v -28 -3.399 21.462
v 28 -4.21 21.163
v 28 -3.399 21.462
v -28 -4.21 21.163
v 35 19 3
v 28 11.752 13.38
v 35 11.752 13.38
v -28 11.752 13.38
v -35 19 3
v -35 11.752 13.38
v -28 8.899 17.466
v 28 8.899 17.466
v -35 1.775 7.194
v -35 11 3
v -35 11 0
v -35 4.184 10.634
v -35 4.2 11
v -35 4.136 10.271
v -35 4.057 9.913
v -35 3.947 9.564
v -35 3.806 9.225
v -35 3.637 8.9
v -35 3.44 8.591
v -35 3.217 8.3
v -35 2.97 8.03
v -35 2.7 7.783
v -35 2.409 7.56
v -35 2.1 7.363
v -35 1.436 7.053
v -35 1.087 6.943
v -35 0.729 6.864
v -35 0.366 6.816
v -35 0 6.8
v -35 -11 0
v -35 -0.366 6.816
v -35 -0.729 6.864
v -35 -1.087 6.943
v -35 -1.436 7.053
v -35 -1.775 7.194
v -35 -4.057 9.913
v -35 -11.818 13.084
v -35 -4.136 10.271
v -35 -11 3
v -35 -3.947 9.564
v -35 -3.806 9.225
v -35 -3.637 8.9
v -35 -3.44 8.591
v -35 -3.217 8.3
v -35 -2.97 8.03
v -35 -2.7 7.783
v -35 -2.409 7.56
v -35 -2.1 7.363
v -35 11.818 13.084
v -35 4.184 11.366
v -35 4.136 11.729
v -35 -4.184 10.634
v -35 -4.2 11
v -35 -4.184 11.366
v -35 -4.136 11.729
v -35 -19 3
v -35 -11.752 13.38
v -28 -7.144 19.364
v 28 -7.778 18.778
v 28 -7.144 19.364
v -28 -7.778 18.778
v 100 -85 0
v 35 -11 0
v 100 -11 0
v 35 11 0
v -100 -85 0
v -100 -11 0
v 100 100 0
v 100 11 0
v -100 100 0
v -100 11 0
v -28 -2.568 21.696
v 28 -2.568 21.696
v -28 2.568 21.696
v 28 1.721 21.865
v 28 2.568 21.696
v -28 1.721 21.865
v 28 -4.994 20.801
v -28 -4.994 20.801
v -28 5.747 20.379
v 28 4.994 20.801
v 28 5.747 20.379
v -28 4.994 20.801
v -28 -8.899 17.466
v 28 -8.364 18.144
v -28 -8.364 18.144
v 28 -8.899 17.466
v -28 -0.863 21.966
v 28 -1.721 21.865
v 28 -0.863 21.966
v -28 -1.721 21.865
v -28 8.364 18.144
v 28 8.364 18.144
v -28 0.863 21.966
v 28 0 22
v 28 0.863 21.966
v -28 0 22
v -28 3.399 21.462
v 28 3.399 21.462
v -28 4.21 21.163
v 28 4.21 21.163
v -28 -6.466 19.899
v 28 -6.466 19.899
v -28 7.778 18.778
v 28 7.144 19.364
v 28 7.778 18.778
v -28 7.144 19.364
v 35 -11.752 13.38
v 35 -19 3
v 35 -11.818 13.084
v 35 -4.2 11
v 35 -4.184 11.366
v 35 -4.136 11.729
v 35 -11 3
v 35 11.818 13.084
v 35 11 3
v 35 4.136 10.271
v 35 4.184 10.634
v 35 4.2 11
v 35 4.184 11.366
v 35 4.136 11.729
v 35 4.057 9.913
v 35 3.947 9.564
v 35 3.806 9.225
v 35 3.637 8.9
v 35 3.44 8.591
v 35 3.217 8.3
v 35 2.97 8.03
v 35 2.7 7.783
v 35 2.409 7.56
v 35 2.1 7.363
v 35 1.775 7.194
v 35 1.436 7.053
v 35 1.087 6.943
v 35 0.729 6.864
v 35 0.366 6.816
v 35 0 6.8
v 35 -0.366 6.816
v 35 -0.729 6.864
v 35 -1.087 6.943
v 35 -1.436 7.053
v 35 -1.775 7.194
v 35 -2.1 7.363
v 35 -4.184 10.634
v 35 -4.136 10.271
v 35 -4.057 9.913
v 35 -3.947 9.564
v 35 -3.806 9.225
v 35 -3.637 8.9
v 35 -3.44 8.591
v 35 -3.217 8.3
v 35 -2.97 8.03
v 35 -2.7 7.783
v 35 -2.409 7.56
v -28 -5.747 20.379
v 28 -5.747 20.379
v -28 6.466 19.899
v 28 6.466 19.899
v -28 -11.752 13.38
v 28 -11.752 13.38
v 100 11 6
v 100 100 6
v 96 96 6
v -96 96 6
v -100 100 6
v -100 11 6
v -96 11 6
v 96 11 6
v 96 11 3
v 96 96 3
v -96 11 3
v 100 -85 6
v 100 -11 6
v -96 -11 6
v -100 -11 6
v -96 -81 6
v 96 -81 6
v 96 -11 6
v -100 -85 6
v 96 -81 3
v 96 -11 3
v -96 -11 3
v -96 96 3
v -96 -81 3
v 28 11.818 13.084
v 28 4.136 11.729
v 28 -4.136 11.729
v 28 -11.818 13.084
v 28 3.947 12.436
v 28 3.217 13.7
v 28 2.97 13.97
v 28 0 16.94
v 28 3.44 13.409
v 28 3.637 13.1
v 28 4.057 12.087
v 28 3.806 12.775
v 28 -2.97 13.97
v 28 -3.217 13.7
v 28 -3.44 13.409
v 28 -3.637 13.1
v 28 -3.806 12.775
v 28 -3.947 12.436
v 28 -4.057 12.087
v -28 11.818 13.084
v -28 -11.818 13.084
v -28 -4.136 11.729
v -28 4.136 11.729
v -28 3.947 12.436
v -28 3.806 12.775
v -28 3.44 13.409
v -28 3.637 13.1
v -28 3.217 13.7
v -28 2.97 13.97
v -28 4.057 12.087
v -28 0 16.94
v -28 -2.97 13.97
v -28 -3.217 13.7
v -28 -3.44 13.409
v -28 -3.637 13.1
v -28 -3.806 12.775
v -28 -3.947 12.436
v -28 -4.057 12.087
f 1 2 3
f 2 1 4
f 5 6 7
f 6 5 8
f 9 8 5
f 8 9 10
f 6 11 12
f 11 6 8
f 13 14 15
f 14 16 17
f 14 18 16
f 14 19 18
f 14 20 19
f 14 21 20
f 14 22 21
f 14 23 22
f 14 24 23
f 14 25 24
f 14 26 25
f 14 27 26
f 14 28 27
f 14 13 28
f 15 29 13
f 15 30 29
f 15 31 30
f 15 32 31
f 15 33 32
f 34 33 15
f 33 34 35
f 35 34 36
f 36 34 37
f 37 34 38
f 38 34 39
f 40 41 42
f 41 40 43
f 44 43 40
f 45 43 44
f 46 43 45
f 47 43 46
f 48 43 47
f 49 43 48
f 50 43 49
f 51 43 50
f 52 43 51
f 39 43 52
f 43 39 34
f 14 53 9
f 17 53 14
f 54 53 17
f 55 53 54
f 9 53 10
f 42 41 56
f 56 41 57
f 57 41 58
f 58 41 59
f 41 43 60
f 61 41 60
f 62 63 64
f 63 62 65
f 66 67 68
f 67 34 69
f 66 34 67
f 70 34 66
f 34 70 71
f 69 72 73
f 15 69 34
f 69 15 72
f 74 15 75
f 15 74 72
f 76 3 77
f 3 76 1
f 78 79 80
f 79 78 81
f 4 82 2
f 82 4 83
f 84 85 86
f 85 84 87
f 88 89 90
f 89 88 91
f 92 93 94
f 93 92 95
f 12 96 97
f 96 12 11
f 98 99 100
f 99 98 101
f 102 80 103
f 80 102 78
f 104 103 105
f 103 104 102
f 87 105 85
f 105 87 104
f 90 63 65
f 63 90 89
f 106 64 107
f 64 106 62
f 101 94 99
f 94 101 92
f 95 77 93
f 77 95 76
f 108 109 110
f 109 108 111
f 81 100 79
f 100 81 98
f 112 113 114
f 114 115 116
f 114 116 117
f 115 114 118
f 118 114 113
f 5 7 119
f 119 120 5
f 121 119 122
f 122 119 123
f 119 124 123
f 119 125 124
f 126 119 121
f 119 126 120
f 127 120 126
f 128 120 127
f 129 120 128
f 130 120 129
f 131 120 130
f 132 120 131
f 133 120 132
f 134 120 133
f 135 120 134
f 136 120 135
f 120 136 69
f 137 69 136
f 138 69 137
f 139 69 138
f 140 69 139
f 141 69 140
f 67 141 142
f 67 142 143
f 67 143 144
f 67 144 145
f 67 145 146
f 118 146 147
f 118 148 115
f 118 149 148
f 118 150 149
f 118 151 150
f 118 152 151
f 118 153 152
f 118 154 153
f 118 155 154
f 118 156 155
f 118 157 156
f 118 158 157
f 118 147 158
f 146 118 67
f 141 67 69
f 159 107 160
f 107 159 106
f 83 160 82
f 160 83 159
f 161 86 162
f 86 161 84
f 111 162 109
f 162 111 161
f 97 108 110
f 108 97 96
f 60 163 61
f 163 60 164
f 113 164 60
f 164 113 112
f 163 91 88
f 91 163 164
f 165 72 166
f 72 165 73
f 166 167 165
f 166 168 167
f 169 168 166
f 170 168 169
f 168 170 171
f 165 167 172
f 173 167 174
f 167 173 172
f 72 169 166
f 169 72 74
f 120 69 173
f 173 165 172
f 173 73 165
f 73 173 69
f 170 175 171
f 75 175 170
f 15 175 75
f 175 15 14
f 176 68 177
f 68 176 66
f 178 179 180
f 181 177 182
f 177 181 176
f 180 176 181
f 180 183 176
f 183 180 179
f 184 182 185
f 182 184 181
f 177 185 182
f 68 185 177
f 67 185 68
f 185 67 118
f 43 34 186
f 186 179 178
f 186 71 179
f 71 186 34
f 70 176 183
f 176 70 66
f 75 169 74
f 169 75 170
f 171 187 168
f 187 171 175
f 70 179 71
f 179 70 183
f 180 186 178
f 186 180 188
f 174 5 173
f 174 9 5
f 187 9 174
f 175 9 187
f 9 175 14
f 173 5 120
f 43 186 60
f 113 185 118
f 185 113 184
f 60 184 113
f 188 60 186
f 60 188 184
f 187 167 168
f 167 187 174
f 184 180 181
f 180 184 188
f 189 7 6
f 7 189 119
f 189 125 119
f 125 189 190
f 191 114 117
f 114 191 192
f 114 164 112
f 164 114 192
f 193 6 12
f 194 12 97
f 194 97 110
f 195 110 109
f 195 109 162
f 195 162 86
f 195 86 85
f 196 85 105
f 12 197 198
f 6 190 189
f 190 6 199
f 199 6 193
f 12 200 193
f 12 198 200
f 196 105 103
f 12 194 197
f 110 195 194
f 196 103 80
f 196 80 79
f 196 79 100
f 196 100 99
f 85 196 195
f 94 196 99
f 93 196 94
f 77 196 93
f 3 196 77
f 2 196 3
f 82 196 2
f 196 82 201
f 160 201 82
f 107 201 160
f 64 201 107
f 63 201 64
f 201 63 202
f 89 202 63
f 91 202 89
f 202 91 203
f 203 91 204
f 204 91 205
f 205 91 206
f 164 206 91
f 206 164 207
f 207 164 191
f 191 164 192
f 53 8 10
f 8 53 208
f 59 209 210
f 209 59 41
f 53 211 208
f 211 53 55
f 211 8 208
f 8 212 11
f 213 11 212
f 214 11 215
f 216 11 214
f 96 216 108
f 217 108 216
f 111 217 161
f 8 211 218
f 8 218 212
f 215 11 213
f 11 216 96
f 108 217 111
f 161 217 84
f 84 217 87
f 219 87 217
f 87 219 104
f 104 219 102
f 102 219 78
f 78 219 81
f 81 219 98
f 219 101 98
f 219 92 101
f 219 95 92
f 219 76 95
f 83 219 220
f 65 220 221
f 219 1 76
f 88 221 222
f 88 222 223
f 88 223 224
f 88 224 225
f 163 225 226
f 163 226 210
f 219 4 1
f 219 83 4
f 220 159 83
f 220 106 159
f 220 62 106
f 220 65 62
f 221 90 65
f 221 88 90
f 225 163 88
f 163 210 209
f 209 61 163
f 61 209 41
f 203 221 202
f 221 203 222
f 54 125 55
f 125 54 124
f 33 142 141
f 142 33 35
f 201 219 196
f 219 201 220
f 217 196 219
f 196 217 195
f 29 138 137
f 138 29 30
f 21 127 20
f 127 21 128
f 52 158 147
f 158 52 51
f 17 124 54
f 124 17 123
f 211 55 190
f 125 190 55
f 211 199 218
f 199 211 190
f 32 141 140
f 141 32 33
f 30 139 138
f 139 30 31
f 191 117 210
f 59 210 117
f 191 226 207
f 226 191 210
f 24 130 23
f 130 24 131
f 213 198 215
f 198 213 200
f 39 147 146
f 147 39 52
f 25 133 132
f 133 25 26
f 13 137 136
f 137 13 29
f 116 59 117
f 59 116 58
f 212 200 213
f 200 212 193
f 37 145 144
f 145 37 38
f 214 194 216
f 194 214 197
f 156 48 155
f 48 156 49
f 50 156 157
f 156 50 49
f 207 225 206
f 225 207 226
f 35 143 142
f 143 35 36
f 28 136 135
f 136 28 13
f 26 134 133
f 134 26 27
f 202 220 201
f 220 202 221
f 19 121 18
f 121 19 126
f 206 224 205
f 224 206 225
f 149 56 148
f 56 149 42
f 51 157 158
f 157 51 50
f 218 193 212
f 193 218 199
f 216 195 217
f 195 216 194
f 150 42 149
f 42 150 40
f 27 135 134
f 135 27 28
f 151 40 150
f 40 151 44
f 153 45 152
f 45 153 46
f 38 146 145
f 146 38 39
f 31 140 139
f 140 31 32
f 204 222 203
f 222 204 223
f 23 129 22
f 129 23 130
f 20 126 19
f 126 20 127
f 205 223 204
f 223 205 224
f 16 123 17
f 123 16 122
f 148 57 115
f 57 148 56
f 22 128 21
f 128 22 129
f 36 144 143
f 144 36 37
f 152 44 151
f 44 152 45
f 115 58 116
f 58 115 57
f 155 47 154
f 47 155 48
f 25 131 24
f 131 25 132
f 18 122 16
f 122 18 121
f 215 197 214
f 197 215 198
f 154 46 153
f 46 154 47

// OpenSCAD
// file: lib/bores.scad
// Shared bore helpers. Lives under cad/lib/ so regen_all.py does not try
// to export it as a printable part (it scans cad/ and cad/calibration/ only).

// Horizontal rod bore, printable without supports: a cylinder along +X
// with a 45-degree teardrop roof. Every part in this project prints in
// its natural orientation, which leaves the hub arm sockets and the vane
// sleeve bore lying horizontally — a plain circle would sag at the
// crown, so the crown is a peak instead. The peak points to +Z: keep the
// part's print orientation equal to its modeled orientation.
//
// The rod fit gauge prints its holes through this same module, so the
// calibrated rod_snug_d / rod_free_d numbers already contain whatever
// error the teardrop introduces.
//
// Starts at x=0, runs to x=l. Subtract it; the caller adds any overrun.
module rod_bore(d, l) {
    r = d / 2;
    rotate([90, 0, 90])
        linear_extrude(height = l)
            polygon(concat(
                // lower ~3/4 circle from 45 deg past top, going clockwise
                [for (a = [45 : 5 : 315]) [r * cos(a + 90), r * sin(a + 90)]],
                // 45-degree roof peak
                [[0, r * sqrt(2)]]));
}
// main file
// ==============================================================================
//   VANE — the flapping flag on the end of each arm (print TWO).
//
//   A sleeve that spins freely on the arm rod, with a stiffened panel
//   hanging from it and a BALANCE PANEL rising above it. The wind
//   mechanism needs ASYMMETRY: a vane that could swing all the way
//   around would just weathervane and the rotor would never start. So
//   the sleeve's end faces carry a pie-shaped stop notch; a stop wedge
//   rides in each (end cap outboard, arm collar inboard, sharing the
//   impact) and limits the swing to vane_swing_deg. Pushed one way the
//   vane folds flat and slips through the wind; pushed the other way
//   it hits the stop, presents its full face, and drags the rotor
//   around. Both vanes stop in the same rotational sense, so their
//   torques add. The bang against the stop is free gull-scaring
//   percussion.
//
//   The balance panel is the low-wind self-start fix: folding a
//   hanging panel means lifting its weight, which for printed plastic
//   takes ~7 m/s of wind, and below that both vanes hang, present the
//   same face, and the rotor rocks instead of spinning. The rise panel
//   moves the center of mass close to the arm axis, cancelling ~3/4 of
//   the gravity moment (geometry_check computes the fraction), so
//   light wind can fold the free vane while the stopped vane still
//   presents both panels' area. The cancellation stays PARTIAL so
//   gravity still defines hanging, the stop-setting reference. As a
//   bonus, both panels add face area on the driven side.
//
//   The notch is cut into BOTH ends: the cap wedge and the collar wedge
//   each get one, and the part fits either arm with either end
//   outboard. Its radial walls match the wedge's flat side faces, so
//   the stop is a face contact. The stop positions are set at assembly
//   by rotating cap and collar to the same angle before clamping (see
//   README).
//
//   Prints flat on the panel, no supports: the sleeve lies on the bed
//   and its bore is a teardrop (lib/bores.scad).
// ==============================================================================

include <design_params.scad>
use <lib/bores.scad>

$fn = 80;

// the stop wedge's own width eats stop_wedge_deg of the notch arc
notch_deg   = vane_swing_deg + stop_wedge_deg;
notch_depth = stop_wedge_len + 1;

module vane() {
    sleeve_r = vane_sleeve_od / 2;
    difference() {
        union() {
            // sleeve, axis along X at z = sleeve_r (lying on the bed)
            translate([-vane_sleeve_len / 2, 0, sleeve_r])
                rotate([0, 90, 0])
                    cylinder(h = vane_sleeve_len, r = sleeve_r);
            // wedge webs joining the sleeve to both panels' near edges
            for (m = [0, 1]) mirror([0, m, 0])
                hull() {
                    translate([-vane_sleeve_len / 2, 0, sleeve_r])
                        rotate([0, 90, 0])
                            cylinder(h = vane_sleeve_len, r = sleeve_r);
                    translate([-vane_sleeve_len / 2, sleeve_r + 4, 0])
                        cube([vane_sleeve_len, 4, vane_t]);
                }
            // the hanging panel (+y) and the balance panel (-y)
            translate([-vane_width / 2, sleeve_r, 0])
                cube([vane_width, vane_drop - sleeve_r, vane_t]);
            translate([-vane_width / 2, -vane_rise, 0])
                cube([vane_width, vane_rise - sleeve_r, vane_t]);
            // stiffening rim: sides of both panels, bottom and top edges
            for (m = [0, 1]) mirror([m, 0, 0]) {
                translate([vane_width / 2 - vane_rim_w, sleeve_r, 0])
                    cube([vane_rim_w, vane_drop - sleeve_r, vane_rim_h]);
                translate([vane_width / 2 - vane_rim_w, -vane_rise, 0])
                    cube([vane_rim_w, vane_rise - sleeve_r, vane_rim_h]);
            }
            translate([-vane_width / 2, vane_drop - vane_rim_w, 0])
                cube([vane_width, vane_rim_w, vane_rim_h]);
            translate([-vane_width / 2, -vane_rise, 0])
                cube([vane_width, vane_rim_w, vane_rim_h]);
        }

        // free-spinning bore
        translate([-vane_sleeve_len / 2 - 0.5, 0, sleeve_r])
            rod_bore(rod_free_d, vane_sleeve_len + 1);

        // stop notches, both end faces, centered on the panel side
        for (m = [0, 1]) mirror([m, 0, 0])
            translate([vane_sleeve_len / 2 - notch_depth, 0, sleeve_r])
                rotate([0, 90, 0])
                    linear_extrude(height = notch_depth + 0.5)
                        pie(sleeve_r + 1, notch_deg);
    }
}

// 2D pie wedge of the given radius/angle. Drawn centered on the -X
// direction of the extrusion plane, which after the rotate([0, 90, 0])
// above points straight up in print orientation — the panel plane's
// NORMAL, not the panel side. Mechanically the notch's angular position
// is arbitrary (the stop angle is set at assembly by rotating cap and
// collar), but main_assembly.scad's wedge_set is derived from this
// reference, so move both together.
module pie(r, deg) {
    polygon(concat([[0, 0]],
        [for (a = [-deg / 2 : 5 : deg / 2]) [-r * cos(a), r * sin(a)]],
        [[-r * cos(deg / 2), r * sin(deg / 2)]]));
}

vane();
